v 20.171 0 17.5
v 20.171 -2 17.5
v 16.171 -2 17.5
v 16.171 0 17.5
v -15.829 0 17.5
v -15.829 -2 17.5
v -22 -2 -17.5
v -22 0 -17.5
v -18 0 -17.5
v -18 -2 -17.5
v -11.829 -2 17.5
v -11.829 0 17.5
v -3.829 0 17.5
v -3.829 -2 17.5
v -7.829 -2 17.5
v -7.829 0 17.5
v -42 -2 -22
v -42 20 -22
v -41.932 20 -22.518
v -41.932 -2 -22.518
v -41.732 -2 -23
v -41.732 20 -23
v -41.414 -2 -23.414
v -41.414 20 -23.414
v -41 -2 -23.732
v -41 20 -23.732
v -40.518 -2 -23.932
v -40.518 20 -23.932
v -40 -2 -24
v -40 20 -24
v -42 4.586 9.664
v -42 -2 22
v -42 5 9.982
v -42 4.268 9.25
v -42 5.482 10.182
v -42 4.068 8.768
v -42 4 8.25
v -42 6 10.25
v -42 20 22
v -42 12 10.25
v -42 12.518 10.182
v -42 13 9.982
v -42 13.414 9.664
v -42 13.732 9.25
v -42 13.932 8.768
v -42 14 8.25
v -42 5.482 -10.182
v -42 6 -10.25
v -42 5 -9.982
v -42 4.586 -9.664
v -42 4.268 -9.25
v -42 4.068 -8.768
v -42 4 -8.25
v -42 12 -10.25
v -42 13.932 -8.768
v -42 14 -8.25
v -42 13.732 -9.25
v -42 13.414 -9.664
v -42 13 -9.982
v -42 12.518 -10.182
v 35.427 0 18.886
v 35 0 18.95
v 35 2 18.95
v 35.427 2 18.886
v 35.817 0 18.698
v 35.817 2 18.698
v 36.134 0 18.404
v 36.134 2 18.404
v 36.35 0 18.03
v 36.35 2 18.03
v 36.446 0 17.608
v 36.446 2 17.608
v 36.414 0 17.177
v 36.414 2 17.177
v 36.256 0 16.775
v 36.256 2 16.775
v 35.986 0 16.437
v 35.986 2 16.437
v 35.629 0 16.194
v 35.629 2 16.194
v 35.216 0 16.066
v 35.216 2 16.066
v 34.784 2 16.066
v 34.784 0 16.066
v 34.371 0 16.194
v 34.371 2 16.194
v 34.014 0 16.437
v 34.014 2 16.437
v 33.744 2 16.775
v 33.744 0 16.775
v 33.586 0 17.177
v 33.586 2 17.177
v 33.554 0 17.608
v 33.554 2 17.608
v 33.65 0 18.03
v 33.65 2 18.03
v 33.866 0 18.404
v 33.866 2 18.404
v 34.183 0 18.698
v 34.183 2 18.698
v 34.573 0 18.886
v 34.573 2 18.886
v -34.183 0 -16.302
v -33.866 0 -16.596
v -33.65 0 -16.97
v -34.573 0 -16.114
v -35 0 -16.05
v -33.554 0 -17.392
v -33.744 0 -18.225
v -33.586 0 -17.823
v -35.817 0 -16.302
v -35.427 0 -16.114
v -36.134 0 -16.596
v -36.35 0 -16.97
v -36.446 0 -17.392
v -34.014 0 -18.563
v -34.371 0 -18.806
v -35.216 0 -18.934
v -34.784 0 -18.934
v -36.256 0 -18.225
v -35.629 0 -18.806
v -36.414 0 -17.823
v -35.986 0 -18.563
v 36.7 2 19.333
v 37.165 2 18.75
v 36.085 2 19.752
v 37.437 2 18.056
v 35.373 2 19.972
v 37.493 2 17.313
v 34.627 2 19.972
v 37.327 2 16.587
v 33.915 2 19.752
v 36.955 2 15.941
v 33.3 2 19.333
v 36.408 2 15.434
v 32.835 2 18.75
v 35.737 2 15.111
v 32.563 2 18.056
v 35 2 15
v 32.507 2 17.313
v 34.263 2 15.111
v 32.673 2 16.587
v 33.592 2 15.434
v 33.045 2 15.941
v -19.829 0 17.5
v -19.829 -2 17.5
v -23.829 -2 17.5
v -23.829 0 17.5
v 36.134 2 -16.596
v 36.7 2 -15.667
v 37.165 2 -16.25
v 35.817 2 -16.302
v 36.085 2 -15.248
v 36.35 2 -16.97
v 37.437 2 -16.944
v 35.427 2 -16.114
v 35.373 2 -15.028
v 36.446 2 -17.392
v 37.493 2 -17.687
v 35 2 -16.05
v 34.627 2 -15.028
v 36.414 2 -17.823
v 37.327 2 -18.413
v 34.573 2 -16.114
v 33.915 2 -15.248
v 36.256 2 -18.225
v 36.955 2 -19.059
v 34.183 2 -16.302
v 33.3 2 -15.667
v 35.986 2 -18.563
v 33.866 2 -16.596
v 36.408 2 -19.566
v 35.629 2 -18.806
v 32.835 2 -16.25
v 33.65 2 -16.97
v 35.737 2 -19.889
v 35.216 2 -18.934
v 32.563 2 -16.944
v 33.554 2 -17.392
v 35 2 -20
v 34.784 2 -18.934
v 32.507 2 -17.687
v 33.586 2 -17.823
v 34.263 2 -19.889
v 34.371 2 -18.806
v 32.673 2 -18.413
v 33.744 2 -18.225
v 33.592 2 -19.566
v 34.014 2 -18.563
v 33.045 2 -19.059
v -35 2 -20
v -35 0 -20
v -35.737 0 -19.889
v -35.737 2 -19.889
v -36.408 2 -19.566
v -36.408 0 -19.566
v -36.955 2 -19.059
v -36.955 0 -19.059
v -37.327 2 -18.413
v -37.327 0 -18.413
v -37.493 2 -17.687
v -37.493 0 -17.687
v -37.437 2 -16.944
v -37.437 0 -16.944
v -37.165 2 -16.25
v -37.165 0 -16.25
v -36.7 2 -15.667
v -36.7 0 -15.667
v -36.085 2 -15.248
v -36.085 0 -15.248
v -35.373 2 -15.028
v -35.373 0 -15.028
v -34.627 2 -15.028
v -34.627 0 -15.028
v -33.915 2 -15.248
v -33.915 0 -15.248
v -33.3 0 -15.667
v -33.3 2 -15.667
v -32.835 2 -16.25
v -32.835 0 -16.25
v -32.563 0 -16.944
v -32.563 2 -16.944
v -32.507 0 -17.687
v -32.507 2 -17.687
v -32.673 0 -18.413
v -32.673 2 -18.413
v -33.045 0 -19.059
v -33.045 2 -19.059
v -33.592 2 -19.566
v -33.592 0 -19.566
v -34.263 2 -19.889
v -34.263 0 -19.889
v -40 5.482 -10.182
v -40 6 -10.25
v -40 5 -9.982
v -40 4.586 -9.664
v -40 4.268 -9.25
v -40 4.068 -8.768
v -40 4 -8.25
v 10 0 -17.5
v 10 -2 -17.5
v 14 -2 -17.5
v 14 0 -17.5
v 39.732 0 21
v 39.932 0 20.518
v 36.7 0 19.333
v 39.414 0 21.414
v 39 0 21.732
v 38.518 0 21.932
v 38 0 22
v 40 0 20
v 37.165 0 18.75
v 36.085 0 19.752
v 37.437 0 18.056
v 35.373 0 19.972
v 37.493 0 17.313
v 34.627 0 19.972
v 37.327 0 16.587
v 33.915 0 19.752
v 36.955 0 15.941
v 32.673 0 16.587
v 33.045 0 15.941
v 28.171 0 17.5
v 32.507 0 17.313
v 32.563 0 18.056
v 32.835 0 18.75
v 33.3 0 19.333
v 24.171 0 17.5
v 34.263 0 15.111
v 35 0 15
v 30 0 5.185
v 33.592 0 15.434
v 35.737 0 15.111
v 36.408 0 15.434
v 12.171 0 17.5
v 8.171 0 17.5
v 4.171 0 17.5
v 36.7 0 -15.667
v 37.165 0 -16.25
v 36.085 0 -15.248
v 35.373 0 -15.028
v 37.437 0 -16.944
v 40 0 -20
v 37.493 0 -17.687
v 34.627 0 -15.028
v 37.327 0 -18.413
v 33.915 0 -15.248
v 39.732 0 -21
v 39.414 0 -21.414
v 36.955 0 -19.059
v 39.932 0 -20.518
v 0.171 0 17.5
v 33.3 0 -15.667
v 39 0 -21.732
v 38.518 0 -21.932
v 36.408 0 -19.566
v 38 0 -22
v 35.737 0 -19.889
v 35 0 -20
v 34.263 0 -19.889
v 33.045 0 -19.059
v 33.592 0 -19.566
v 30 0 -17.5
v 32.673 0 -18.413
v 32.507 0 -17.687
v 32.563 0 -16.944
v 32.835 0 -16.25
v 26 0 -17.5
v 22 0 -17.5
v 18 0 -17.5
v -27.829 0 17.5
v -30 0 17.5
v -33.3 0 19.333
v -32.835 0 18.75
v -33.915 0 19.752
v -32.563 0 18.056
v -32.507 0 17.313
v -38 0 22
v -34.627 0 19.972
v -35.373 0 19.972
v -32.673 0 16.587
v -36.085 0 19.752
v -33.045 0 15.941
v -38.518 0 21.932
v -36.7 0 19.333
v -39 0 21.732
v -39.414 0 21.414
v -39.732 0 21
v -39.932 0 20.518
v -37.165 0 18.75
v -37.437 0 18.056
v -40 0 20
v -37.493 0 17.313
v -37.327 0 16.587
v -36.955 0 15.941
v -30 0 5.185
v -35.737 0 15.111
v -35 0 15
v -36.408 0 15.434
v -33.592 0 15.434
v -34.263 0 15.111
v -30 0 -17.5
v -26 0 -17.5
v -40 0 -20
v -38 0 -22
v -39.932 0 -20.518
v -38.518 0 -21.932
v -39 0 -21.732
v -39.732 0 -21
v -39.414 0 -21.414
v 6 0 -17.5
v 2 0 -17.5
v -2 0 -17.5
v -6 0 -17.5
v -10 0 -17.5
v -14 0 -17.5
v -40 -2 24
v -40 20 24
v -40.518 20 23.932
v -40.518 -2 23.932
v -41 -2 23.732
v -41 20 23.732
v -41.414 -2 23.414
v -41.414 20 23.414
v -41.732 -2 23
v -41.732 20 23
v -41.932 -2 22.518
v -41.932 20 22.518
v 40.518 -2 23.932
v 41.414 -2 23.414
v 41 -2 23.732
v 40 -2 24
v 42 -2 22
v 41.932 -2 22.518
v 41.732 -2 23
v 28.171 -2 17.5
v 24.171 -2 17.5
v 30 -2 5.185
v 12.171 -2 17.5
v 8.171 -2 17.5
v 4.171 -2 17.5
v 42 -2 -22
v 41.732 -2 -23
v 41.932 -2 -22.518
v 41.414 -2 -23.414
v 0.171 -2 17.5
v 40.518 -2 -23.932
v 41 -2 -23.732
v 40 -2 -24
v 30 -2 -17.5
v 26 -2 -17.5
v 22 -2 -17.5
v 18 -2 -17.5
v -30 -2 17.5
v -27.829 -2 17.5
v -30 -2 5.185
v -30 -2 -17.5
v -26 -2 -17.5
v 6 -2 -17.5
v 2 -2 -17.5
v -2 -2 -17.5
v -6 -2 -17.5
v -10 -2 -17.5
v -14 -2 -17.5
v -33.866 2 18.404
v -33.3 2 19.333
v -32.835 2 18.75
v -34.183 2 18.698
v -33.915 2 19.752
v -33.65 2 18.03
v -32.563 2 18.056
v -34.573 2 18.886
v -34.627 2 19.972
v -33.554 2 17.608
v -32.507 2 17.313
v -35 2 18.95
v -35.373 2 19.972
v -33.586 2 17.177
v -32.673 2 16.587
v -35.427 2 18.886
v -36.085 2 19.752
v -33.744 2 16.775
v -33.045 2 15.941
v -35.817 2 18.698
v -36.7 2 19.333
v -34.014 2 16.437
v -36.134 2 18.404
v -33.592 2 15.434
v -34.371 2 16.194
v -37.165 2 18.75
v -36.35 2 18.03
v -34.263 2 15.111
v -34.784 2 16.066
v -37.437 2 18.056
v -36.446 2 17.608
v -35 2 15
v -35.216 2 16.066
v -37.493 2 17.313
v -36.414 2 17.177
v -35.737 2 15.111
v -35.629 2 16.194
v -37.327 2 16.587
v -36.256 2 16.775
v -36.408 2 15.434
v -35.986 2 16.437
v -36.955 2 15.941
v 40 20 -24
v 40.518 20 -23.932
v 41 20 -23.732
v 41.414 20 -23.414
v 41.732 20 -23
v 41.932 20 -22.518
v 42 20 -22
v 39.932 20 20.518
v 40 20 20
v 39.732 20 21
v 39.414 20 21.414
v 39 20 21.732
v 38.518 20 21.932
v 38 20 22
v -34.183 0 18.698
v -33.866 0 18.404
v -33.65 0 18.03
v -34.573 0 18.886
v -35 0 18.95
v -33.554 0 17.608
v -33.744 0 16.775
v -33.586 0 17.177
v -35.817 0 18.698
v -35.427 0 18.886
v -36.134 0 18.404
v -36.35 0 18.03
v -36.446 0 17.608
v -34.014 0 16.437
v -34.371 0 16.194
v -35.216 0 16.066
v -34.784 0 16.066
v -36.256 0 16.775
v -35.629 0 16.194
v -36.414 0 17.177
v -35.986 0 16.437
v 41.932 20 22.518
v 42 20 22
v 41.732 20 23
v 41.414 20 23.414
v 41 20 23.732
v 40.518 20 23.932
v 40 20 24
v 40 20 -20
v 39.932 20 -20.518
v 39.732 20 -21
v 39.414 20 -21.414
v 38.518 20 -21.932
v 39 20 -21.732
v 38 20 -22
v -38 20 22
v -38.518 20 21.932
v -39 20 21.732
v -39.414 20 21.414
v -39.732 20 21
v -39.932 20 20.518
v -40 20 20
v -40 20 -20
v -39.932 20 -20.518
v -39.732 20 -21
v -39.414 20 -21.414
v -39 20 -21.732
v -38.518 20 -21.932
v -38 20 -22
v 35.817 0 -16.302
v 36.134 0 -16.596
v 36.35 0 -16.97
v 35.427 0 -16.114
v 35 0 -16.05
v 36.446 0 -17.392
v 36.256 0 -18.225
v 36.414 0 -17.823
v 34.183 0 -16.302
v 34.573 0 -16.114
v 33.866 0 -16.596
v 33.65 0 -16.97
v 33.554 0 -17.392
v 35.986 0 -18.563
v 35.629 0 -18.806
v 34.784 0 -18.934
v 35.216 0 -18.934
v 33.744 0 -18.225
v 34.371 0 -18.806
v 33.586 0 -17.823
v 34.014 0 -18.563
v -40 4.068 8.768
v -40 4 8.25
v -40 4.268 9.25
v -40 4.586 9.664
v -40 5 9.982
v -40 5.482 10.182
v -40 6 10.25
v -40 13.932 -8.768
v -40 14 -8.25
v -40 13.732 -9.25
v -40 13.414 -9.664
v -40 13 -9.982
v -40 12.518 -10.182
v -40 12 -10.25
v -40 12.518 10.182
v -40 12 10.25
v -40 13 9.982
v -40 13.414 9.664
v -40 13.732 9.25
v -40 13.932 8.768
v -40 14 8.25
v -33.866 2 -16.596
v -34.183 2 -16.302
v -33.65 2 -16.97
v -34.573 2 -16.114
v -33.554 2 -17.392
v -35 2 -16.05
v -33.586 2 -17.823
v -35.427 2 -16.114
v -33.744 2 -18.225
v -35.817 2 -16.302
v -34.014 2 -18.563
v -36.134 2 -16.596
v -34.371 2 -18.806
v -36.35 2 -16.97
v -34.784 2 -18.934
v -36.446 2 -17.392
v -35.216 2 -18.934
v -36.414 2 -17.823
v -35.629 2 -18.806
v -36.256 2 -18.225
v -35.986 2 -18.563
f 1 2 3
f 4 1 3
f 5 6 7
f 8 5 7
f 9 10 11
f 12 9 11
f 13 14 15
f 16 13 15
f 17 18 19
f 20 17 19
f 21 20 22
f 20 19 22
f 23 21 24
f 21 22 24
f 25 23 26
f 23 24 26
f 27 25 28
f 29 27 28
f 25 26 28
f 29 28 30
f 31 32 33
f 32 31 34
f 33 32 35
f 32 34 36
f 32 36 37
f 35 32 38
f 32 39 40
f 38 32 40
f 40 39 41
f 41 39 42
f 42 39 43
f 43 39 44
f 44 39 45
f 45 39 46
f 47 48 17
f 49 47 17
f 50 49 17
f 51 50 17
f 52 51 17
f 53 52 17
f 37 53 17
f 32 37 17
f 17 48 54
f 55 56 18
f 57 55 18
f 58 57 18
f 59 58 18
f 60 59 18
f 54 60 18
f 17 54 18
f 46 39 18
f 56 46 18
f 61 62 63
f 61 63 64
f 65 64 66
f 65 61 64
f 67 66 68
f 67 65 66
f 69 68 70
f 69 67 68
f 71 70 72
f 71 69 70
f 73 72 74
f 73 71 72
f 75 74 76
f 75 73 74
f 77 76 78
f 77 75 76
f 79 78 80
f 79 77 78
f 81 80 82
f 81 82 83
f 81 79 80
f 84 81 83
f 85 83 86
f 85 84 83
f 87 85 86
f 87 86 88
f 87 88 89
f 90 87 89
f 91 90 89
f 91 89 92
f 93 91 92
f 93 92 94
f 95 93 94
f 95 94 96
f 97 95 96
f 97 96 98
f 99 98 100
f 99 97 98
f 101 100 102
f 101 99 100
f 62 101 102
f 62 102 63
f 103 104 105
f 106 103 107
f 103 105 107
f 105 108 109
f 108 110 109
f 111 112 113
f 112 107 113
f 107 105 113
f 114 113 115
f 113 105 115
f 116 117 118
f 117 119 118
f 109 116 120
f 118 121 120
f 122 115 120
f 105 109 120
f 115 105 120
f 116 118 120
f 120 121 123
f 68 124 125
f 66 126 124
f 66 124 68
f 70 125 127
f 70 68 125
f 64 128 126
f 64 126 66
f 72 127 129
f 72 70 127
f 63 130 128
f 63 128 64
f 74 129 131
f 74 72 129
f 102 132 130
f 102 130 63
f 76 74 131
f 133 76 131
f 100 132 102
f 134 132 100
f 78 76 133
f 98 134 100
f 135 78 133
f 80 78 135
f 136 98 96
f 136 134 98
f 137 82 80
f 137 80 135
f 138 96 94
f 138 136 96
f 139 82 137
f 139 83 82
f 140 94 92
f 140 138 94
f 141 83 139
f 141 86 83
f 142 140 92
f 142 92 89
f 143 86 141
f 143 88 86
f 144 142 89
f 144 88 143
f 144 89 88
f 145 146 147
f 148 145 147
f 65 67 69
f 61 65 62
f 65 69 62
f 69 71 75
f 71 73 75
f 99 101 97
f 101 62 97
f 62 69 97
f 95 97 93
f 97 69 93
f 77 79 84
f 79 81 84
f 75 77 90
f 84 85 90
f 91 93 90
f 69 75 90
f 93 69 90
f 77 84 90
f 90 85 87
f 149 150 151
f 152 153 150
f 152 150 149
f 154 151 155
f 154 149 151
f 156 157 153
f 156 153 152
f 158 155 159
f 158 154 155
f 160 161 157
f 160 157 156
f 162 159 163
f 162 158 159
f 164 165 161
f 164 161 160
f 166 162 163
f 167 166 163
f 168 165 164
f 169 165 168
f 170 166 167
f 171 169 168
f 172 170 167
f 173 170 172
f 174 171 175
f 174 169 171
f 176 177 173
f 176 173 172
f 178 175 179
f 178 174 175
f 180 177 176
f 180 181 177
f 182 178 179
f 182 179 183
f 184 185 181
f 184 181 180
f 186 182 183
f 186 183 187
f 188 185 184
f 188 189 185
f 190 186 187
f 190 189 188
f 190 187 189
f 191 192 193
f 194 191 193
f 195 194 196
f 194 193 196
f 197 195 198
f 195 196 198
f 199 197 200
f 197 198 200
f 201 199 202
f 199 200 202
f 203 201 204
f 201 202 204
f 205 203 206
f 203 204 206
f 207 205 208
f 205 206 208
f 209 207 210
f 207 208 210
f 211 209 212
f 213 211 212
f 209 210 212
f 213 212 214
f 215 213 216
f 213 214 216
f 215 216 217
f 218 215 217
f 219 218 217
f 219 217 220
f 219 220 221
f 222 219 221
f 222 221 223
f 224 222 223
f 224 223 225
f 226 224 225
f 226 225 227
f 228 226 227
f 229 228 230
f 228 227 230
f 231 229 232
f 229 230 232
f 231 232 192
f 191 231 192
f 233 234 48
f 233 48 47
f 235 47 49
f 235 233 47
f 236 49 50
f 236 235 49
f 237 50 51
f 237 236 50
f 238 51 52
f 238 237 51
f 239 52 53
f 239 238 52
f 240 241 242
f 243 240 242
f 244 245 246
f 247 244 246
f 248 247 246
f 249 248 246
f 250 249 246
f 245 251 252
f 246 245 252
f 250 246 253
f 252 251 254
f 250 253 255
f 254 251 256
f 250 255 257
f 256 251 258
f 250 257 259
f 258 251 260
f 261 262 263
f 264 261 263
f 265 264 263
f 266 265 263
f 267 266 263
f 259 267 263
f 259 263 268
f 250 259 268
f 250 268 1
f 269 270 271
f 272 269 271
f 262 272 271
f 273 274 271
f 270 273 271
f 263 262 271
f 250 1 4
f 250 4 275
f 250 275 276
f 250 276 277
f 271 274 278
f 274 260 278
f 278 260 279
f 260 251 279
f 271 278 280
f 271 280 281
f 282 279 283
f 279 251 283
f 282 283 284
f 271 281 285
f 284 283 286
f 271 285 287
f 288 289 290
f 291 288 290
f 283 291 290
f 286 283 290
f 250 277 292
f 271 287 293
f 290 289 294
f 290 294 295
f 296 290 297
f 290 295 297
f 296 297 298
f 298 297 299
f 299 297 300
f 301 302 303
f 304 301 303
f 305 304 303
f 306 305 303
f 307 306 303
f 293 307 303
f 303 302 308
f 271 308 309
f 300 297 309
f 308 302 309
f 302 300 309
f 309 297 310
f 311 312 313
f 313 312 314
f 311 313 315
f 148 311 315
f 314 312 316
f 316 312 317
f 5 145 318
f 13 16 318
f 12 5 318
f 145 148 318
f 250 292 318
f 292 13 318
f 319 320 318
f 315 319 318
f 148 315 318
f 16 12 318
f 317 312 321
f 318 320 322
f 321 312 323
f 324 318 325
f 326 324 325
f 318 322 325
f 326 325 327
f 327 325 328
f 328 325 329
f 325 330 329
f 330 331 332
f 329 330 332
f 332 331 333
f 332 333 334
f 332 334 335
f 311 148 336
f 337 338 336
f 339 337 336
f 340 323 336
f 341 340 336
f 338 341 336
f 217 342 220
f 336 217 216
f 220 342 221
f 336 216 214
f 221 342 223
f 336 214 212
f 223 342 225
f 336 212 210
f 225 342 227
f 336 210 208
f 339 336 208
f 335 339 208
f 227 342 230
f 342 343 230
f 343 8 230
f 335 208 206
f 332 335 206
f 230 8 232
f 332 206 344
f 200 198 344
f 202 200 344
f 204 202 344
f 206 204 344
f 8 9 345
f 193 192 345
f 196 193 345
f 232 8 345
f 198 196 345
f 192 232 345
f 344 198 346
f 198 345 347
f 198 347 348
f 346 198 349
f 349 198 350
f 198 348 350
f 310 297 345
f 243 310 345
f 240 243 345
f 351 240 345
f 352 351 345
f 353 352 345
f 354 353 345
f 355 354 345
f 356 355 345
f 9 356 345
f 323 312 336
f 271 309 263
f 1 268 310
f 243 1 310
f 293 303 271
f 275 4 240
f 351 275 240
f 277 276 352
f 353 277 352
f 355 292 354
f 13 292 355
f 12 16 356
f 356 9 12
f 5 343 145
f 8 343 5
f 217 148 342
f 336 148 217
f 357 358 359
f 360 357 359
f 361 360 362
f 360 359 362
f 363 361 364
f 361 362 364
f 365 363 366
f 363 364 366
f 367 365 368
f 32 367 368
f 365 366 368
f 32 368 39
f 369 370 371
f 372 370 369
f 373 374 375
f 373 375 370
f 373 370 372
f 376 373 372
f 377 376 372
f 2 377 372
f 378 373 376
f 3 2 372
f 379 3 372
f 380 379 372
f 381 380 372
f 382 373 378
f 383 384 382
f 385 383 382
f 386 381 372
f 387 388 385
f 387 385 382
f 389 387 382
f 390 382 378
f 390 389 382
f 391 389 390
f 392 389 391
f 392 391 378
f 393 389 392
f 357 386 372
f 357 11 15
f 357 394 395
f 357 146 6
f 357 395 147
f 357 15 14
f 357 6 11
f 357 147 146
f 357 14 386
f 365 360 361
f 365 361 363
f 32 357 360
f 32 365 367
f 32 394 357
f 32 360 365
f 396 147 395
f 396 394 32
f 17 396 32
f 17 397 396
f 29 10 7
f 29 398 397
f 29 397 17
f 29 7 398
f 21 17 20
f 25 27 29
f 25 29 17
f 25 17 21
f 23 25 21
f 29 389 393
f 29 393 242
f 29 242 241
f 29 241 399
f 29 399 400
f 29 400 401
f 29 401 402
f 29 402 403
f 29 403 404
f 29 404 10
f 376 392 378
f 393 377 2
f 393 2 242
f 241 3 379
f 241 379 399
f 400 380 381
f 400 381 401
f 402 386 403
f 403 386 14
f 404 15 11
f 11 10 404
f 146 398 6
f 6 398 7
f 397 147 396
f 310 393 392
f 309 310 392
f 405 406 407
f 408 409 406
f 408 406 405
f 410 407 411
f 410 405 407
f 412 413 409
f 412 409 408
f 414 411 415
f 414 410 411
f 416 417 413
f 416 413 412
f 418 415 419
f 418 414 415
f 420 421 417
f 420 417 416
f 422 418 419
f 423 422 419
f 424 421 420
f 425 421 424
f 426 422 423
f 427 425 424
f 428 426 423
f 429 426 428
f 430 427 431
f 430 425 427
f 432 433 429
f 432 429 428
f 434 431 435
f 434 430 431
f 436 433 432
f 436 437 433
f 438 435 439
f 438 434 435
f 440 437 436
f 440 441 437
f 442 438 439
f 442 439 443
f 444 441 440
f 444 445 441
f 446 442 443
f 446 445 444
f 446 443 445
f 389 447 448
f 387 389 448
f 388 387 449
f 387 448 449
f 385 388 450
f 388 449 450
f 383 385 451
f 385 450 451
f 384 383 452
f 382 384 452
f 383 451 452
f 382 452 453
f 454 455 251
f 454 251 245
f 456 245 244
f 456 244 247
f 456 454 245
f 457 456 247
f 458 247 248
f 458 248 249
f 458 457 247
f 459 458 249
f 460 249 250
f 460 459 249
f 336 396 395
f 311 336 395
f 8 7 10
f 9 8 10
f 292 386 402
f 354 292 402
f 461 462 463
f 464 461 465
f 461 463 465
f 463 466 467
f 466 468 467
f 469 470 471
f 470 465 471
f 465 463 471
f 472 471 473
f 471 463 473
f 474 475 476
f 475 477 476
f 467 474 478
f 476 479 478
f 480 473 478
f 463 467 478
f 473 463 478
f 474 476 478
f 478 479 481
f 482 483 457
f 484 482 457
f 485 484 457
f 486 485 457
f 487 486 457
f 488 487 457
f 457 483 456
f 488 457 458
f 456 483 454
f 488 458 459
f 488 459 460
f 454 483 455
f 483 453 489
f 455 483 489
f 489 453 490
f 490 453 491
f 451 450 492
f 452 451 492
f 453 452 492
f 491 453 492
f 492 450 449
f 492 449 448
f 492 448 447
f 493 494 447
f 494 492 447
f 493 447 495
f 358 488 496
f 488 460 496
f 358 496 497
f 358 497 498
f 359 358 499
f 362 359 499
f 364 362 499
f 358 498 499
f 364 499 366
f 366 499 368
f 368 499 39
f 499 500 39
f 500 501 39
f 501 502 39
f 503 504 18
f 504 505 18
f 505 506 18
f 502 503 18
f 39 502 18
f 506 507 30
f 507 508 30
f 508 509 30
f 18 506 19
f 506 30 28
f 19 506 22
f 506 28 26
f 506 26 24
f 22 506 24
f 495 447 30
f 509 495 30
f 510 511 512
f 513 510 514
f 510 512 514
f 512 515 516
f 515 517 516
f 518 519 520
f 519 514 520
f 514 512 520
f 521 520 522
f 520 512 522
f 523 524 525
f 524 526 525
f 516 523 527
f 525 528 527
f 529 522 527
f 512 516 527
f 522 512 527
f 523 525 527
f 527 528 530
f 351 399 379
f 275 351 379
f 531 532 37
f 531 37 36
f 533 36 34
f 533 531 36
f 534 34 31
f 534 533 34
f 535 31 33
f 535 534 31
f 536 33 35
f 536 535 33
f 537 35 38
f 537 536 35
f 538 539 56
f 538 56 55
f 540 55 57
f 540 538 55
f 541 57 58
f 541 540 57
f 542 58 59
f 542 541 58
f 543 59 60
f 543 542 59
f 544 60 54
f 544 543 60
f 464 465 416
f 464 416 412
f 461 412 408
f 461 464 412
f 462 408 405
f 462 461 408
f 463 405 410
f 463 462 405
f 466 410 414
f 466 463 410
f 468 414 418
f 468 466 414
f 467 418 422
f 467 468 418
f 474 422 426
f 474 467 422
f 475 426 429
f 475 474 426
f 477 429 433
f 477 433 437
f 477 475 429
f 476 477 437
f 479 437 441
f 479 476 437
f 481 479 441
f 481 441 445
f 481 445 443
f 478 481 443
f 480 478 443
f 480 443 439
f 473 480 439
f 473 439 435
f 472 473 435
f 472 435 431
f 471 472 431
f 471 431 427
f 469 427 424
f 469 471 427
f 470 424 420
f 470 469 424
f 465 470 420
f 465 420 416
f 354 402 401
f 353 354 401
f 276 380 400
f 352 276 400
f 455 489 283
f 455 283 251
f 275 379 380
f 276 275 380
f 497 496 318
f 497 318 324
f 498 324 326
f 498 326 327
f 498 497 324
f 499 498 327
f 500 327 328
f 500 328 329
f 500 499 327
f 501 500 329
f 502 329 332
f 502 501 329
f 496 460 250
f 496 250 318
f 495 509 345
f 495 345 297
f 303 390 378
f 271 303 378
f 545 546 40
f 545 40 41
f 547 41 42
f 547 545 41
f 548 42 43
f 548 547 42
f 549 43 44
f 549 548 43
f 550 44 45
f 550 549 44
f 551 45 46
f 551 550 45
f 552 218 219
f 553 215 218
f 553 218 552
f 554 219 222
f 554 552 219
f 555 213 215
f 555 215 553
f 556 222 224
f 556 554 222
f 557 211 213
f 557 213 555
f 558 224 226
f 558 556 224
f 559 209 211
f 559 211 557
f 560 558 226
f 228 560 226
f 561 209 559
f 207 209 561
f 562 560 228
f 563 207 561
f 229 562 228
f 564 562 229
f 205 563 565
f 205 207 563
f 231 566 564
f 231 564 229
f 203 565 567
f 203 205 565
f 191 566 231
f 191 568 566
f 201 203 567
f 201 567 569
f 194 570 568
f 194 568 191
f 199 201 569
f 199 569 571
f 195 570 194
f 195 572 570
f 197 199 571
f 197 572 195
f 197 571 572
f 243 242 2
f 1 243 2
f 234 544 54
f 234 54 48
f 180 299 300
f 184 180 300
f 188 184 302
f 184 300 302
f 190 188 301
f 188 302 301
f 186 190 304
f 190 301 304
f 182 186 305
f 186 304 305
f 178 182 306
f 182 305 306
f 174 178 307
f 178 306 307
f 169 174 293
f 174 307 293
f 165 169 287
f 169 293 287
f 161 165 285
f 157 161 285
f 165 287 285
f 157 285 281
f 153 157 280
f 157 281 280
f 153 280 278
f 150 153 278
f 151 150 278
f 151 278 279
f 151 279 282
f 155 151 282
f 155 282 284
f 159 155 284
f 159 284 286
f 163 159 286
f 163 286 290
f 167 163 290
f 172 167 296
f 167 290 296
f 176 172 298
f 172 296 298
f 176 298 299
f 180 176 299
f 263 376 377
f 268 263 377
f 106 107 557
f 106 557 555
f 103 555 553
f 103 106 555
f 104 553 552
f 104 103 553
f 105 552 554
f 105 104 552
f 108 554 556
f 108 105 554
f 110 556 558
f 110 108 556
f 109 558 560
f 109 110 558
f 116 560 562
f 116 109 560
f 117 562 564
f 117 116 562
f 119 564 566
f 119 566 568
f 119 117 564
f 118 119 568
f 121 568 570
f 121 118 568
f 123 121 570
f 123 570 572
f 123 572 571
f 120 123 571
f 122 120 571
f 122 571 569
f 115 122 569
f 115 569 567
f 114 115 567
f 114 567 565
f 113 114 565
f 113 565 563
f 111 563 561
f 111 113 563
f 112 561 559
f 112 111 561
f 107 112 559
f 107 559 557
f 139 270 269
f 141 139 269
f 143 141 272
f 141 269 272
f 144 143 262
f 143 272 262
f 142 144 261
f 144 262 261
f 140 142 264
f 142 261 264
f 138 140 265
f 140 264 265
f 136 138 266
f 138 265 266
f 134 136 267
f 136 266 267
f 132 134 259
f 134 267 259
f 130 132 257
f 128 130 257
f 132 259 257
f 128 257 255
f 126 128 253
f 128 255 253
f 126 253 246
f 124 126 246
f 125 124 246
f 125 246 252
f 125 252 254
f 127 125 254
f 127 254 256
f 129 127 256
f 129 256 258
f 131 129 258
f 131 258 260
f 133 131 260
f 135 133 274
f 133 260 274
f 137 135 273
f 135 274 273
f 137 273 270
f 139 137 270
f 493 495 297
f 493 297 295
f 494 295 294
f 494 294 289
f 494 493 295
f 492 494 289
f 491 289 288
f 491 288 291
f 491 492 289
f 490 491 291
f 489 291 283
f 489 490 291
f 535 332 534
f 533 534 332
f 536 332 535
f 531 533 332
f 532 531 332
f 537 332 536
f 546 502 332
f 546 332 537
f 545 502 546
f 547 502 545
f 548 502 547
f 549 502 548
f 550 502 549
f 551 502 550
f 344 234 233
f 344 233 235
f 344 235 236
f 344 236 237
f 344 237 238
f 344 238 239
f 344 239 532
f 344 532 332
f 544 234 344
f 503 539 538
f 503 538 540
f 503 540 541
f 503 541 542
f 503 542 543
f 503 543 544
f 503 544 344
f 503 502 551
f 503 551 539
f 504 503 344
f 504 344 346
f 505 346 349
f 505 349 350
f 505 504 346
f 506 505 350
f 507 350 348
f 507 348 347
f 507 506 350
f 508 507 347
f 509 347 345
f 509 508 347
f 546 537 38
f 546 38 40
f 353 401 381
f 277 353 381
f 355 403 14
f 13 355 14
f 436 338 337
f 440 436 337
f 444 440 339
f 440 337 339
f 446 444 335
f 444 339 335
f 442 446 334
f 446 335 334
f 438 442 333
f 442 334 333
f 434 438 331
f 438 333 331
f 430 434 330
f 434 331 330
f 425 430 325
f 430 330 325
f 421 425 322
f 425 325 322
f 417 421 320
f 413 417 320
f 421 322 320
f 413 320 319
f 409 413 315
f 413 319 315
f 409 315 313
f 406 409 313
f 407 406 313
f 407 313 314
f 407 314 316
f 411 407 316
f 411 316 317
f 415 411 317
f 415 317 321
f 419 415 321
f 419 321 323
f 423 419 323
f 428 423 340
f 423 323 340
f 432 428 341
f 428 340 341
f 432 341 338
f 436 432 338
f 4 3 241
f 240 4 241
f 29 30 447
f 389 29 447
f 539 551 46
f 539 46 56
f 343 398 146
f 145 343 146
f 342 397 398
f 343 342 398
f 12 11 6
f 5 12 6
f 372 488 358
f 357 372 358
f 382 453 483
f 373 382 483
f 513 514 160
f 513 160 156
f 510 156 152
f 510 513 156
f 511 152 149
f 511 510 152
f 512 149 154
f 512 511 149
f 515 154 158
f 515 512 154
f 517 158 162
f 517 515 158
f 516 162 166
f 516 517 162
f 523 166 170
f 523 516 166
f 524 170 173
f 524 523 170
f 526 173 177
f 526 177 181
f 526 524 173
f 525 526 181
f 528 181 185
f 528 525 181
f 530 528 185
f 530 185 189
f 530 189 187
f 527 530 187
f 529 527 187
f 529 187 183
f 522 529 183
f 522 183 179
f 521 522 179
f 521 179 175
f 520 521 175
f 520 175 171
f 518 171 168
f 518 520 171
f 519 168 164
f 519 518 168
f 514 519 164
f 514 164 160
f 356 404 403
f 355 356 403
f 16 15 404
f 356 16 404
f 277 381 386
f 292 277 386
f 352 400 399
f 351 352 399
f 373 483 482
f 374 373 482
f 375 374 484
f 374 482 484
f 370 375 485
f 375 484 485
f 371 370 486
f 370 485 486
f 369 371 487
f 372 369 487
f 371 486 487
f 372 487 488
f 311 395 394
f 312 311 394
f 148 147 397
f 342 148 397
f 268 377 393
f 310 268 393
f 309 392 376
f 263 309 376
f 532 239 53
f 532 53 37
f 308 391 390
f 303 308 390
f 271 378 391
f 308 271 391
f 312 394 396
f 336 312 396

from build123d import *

# Parameters (mm, degrees)
EXTRUDE_1_DEPTH     = 2
EXTRUDE_START       = 20
EXTRUDE_3_DEPTH     = 20
SKETCH_1_5_R        = 2.5
SKETCH_1_5_R_2      = 1.45
EXTRUDE_4_DEPTH     = 2
CUT_EXTRUDE_2_DEPTH = 2
CUT_EXTRUDE_3_DEPTH = 2


with BuildPart() as part:
    # 草图1 → 凸台-拉伸1 (new body)
    with BuildSketch(Plane(origin=(0, 0, 0), x_dir=(1, 0, 0), z_dir=(0, 1, 0))):
        with BuildLine():
            Line((-40, 24), (40, 24))
            ThreePointArc((40, 24), (41.414213562, 23.414213562), (42, 22))
            Line((42, 22), (42, -22))
            ThreePointArc((42, -22), (41.414213562, -23.414213562), (40, -24))
            Line((40, -24), (-40, -24))
            ThreePointArc((-40, -24), (-41.414213562, -23.414213562), (-42, -22))
            Line((-42, -22), (-42, 22))
            ThreePointArc((-42, 22), (-41.414213562, 23.414213562), (-40, 24))
        make_face()
    extrude(amount=-EXTRUDE_1_DEPTH)

    # 草图1<4> → 凸台-拉伸3 (add)
    with BuildSketch(Plane(origin=(0, 0, 0), x_dir=(1, 0, 0), z_dir=(0, 1, 0)).offset(EXTRUDE_START)):
        with BuildLine():
            Line((-40, 24), (40, 24))
            ThreePointArc((40, 24), (41.414213562, 23.414213562), (42, 22))
            Line((42, 22), (42, -22))
            ThreePointArc((42, -22), (41.414213562, -23.414213562), (40, -24))
            Line((40, -24), (-40, -24))
            ThreePointArc((-40, -24), (-41.414213562, -23.414213562), (-42, -22))
            Line((-42, -22), (-42, 22))
            ThreePointArc((-42, 22), (-41.414213562, 23.414213562), (-40, 24))
        make_face()
        with BuildLine():
            Line((-38, 22), (38, 22))
            ThreePointArc((38, 22), (39.414213562, 21.414213562), (40, 20))
            Line((40, 20), (40, -20))
            ThreePointArc((40, -20), (39.414213562, -21.414213562), (38, -22))
            Line((38, -22), (-38, -22))
            ThreePointArc((-38, -22), (-39.414213562, -21.414213562), (-40, -20))
            Line((-40, -20), (-40, 20))
            ThreePointArc((-40, 20), (-39.414213562, 21.414213562), (-38, 22))
        make_face(mode=Mode.SUBTRACT)
    extrude(amount=-EXTRUDE_3_DEPTH)

    # 草图1<5> → 凸台-拉伸4 (add)
    # profile 1 of 4: a face of its own
    with BuildSketch(Plane(origin=(0, 0, 0), x_dir=(1, 0, 0), z_dir=(0, 1, 0))):
        with Locations((-35, 17.5)):
            Circle(SKETCH_1_5_R)
        with Locations((-35, 17.5)):
            Circle(SKETCH_1_5_R_2, mode=Mode.SUBTRACT)
    # profile 2 of 4: a face of its own
    with BuildSketch(Plane(origin=(0, 0, 0), x_dir=(1, 0, 0), z_dir=(0, 1, 0))):
        with Locations((35, 17.5)):
            Circle(SKETCH_1_5_R)
        with Locations((35, 17.5)):
            Circle(SKETCH_1_5_R_2, mode=Mode.SUBTRACT)
    # profile 3 of 4: a face of its own
    with BuildSketch(Plane(origin=(0, 0, 0), x_dir=(1, 0, 0), z_dir=(0, 1, 0))):
        with Locations((35, -17.5)):
            Circle(SKETCH_1_5_R)
        with Locations((35, -17.5)):
            Circle(SKETCH_1_5_R_2, mode=Mode.SUBTRACT)
    # profile 4 of 4: a face of its own
    with BuildSketch(Plane(origin=(0, 0, 0), x_dir=(1, 0, 0), z_dir=(0, 1, 0))):
        with Locations((-35, -17.5)):
            Circle(SKETCH_1_5_R)
        with Locations((-35, -17.5)):
            Circle(SKETCH_1_5_R_2, mode=Mode.SUBTRACT)
    extrude(amount=EXTRUDE_4_DEPTH)

    # 草图2 → 切除-拉伸2 (cut)
    with BuildSketch(Plane.XZ.offset(2)):
        Polygon((-19.828555675, 17.5), (-23.828555675, 17.5), (-30, -17.5), (-26, -17.5), align=None)
        Polygon((-30, 5.185127278), (-27.828555675, 17.5), (-30, 17.5), align=None)
        Polygon((-11.828555675, 17.5), (-15.828555675, 17.5), (-22, -17.5), (-18, -17.5), align=None)
        Polygon((-3.828555675, 17.5), (-7.828555675, 17.5), (-14, -17.5), (-10, -17.5), align=None)
        Polygon((4.171444325, 17.5), (0.171444325, 17.5), (-6, -17.5), (-2, -17.5), align=None)
        Polygon((12.171444325, 17.5), (8.171444325, 17.5), (2, -17.5), (6, -17.5), align=None)
        Polygon((20.171444325, 17.5), (16.171444325, 17.5), (10, -17.5), (14, -17.5), align=None)
        Polygon((28.171444325, 17.5), (24.171444325, 17.5), (18, -17.5), (22, -17.5), align=None)
        Polygon((30, 5.185127278), (26, -17.5), (30, -17.5), align=None)
    extrude(amount=-CUT_EXTRUDE_2_DEPTH, mode=Mode.SUBTRACT)

    # 草图3 → 切除-拉伸3 (cut)
    with BuildSketch(Plane(origin=(-40, 0, 0), x_dir=(0, 0, -1), z_dir=(1, 0, 0))):
        with BuildLine():
            Line((-10.25, 6), (-10.25, 12))
            ThreePointArc((-10.25, 12), (-9.664213562, 13.414213562), (-8.25, 14))
            Line((-8.25, 14), (8.25, 14))
            ThreePointArc((8.25, 14), (9.664213562, 13.414213562), (10.25, 12))
            Line((10.25, 12), (10.25, 6))
            ThreePointArc((10.25, 6), (9.664213562, 4.585786438), (8.25, 4))
            Line((8.25, 4), (-8.25, 4))
            ThreePointArc((-8.25, 4), (-9.664213562, 4.585786438), (-10.25, 6))
        make_face()
    extrude(amount=-CUT_EXTRUDE_3_DEPTH, mode=Mode.SUBTRACT)


solid = part.part
